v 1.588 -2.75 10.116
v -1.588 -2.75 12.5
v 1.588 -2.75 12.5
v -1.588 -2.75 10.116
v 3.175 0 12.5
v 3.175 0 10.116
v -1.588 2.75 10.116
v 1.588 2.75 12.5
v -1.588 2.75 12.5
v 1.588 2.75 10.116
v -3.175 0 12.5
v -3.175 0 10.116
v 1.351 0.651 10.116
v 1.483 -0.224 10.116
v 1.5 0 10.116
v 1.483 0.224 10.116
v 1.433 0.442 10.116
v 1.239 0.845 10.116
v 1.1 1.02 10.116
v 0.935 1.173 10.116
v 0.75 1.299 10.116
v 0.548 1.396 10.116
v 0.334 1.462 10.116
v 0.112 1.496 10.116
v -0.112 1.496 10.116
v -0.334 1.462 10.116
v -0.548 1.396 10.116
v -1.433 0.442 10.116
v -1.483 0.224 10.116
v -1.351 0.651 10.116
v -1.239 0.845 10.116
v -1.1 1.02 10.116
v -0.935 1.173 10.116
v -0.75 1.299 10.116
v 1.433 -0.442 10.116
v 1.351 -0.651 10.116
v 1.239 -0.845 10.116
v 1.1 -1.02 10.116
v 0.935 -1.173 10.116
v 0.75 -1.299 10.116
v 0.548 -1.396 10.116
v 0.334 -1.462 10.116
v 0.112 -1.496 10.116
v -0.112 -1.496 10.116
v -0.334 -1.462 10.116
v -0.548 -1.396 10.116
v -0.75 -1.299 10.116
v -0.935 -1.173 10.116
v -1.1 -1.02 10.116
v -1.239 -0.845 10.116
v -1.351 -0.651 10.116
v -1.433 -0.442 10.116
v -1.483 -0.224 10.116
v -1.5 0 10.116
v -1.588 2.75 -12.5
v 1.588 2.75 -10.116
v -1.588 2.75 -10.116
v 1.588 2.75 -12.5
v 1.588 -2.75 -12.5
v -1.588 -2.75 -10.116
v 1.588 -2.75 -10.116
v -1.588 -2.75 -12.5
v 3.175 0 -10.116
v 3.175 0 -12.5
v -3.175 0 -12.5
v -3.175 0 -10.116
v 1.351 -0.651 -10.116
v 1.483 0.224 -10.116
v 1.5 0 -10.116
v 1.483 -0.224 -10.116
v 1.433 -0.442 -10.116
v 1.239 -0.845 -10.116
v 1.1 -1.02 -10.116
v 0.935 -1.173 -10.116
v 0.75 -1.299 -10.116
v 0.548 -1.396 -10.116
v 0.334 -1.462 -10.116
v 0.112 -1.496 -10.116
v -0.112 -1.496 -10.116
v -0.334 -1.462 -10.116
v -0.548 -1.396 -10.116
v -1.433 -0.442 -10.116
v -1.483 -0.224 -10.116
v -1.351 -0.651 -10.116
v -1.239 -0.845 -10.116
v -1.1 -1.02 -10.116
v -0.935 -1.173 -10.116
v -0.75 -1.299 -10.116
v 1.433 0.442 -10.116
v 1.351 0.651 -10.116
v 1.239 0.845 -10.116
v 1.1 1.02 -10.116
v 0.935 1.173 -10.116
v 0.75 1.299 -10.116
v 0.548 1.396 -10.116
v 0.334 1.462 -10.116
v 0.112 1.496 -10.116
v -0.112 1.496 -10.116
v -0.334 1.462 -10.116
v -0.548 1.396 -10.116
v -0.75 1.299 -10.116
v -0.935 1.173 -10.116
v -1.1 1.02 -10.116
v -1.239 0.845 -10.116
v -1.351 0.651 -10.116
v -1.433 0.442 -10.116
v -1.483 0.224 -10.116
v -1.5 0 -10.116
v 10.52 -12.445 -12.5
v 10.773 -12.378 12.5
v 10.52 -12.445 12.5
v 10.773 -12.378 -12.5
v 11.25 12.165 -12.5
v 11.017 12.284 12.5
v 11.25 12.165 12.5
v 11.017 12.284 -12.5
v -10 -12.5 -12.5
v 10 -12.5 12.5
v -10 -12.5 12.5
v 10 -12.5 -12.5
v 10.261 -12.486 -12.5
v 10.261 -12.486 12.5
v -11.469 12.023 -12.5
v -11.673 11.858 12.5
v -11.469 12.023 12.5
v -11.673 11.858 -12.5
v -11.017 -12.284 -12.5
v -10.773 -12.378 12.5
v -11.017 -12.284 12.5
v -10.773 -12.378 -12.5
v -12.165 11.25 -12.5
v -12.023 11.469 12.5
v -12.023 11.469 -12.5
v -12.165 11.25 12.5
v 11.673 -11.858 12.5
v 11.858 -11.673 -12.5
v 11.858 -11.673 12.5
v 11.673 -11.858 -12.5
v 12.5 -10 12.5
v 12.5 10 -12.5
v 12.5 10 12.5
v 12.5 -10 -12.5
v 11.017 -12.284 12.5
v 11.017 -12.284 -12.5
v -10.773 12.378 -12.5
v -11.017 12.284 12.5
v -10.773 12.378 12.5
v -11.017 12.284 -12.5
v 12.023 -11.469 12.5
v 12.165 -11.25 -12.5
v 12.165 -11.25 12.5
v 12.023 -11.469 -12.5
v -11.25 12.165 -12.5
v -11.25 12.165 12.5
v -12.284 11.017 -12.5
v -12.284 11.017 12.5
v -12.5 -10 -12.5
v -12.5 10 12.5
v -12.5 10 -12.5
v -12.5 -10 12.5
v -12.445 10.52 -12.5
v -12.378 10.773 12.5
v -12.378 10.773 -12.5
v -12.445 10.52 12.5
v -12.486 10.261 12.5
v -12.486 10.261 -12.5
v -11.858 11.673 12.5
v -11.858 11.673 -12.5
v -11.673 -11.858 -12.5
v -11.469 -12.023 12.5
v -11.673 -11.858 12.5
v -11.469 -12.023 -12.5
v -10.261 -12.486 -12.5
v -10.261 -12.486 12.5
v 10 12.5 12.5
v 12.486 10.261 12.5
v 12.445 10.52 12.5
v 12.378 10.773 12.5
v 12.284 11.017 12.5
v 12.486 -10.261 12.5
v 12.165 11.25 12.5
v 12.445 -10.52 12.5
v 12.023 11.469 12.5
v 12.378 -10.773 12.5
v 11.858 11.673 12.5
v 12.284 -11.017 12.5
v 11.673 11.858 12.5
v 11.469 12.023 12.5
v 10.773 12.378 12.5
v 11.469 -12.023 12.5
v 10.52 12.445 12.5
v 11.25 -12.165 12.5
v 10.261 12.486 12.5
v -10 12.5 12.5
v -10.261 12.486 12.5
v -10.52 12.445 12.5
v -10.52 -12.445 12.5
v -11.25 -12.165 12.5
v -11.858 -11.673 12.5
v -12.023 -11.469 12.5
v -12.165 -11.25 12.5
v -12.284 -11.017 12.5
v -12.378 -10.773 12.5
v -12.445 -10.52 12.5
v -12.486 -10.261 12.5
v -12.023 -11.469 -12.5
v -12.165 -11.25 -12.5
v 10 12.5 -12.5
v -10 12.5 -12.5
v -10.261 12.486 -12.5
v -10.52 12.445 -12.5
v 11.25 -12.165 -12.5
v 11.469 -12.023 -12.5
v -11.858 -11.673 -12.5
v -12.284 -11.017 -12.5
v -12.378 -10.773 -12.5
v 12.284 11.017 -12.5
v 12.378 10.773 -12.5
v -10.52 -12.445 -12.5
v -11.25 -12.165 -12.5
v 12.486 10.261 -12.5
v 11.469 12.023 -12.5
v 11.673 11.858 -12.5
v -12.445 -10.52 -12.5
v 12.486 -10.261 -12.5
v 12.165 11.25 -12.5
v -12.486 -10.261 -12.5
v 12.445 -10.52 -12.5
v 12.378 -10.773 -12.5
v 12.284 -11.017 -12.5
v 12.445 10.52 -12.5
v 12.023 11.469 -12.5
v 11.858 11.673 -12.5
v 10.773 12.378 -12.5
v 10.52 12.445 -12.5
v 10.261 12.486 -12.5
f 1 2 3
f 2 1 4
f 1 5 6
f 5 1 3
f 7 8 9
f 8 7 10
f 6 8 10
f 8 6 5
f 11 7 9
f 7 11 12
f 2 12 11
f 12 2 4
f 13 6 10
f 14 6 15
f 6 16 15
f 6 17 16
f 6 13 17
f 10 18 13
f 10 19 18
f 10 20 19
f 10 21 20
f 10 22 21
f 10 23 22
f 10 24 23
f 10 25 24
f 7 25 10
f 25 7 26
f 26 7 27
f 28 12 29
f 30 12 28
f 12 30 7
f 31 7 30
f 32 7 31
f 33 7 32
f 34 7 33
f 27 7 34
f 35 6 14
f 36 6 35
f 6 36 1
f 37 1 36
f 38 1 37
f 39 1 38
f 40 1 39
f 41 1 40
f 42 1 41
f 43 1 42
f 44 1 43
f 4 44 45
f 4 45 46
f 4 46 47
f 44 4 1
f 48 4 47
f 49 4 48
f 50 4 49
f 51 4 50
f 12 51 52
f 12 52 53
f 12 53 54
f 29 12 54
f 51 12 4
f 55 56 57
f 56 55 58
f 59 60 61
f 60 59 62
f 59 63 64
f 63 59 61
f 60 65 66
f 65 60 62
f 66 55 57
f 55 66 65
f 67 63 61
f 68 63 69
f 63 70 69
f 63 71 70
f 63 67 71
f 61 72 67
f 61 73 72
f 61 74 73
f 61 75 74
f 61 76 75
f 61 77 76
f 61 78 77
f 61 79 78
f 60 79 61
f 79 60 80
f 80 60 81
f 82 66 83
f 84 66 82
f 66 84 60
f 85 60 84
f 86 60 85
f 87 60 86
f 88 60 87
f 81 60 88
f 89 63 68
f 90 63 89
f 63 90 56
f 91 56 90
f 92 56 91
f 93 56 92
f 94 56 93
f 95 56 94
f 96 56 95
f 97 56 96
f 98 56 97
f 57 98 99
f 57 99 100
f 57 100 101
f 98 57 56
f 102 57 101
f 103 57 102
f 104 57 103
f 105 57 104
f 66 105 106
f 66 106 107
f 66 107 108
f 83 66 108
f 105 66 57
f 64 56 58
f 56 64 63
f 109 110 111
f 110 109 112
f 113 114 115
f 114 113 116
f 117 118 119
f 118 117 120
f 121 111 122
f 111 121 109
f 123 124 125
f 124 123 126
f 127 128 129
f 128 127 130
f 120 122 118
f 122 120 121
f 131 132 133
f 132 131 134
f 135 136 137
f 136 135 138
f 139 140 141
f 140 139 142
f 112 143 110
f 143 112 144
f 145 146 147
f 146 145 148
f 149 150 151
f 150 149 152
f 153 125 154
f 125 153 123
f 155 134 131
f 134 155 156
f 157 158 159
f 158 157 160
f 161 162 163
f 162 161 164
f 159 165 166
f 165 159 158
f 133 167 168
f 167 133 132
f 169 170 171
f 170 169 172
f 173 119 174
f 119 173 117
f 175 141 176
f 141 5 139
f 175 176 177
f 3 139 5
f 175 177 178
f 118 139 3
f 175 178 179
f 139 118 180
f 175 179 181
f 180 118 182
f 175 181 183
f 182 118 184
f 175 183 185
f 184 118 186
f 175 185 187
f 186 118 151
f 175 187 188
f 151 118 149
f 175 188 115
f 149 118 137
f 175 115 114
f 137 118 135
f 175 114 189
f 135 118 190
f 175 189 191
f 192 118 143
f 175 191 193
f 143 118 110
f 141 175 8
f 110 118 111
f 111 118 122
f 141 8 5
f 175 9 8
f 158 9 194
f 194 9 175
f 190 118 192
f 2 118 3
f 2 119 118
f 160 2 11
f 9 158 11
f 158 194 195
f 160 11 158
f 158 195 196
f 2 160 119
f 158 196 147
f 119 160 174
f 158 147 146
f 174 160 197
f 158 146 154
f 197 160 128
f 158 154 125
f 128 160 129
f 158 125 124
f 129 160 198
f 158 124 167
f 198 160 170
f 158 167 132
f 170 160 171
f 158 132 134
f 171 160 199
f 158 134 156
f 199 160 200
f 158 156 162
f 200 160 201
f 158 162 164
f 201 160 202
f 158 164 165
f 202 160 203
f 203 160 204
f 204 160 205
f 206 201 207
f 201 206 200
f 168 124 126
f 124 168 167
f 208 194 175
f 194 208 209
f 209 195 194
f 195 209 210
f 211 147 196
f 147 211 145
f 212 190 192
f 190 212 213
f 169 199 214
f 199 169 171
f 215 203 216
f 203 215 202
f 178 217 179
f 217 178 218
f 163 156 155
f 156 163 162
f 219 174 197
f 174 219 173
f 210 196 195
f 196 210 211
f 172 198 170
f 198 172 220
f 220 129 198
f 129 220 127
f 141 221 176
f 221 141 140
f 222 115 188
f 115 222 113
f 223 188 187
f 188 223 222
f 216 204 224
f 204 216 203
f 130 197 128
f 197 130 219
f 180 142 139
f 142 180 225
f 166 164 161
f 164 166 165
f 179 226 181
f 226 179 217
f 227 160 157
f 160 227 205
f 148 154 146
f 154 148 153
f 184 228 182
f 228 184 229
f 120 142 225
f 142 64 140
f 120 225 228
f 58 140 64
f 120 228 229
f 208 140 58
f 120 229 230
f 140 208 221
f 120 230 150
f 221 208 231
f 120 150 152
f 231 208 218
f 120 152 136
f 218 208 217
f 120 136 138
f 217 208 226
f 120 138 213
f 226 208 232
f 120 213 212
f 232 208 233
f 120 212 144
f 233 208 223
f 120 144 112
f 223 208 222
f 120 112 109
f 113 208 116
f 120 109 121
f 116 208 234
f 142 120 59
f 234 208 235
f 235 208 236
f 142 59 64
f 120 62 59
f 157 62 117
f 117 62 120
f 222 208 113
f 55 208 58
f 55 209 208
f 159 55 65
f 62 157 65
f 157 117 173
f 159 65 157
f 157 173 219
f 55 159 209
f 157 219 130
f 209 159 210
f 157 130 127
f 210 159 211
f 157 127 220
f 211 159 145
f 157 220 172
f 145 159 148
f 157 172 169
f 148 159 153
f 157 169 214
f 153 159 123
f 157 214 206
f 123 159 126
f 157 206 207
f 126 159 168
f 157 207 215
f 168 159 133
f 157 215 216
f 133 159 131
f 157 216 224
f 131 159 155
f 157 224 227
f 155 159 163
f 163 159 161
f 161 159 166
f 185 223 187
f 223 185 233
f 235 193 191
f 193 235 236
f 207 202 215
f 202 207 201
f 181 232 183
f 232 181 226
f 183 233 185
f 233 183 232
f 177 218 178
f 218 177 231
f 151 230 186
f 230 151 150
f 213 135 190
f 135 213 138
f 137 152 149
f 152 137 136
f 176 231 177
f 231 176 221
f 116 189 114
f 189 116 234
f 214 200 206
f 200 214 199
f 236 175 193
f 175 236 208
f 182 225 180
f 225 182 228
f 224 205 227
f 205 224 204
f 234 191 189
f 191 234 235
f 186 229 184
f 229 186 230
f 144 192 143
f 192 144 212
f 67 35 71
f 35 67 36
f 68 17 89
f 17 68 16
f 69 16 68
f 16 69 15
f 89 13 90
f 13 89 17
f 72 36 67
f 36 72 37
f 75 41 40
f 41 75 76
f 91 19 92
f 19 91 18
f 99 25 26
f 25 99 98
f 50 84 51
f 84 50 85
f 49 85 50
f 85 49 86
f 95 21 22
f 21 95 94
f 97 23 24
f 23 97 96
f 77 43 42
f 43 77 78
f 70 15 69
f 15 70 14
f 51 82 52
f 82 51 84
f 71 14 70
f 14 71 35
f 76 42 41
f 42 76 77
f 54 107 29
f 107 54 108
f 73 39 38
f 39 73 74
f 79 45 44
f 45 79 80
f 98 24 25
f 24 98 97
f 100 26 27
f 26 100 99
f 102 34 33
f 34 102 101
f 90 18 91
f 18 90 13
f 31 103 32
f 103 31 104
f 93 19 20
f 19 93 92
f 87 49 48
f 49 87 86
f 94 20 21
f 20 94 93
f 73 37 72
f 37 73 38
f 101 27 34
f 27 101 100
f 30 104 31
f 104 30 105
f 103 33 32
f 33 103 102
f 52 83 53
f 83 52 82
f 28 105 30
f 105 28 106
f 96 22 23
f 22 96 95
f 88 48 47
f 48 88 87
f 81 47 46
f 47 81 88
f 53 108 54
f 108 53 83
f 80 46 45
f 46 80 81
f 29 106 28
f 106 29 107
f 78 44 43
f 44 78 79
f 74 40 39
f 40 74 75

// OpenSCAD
// file: ../../globals.scad
//$fa = $preview? 12 : 6;
//$fs = $preview? 2 : 0.2;

EPS = 1/64;

// Used for indexing coordinates since the dot syntax is not
// officialy supported
X = 0;
Y = 1;
Z = 2;

// Slicer defaults
LAYER_HEIGHT = 0.15;
EXTRUSION_WIDTH = 0.45;

function nearest_layer_height(n) = round(n / LAYER_HEIGHT) * LAYER_HEIGHT;
function nearest_extrusion_width(n) = round(n / EXTRUSION_WIDTH) * EXTRUSION_WIDTH;

// Defaults for all parts
WALL_XS = nearest_extrusion_width(1.25);
WALL_S = nearest_extrusion_width(2);
WALL = nearest_extrusion_width(3);
WALL_L = nearest_extrusion_width(5);
WALL_XL = nearest_extrusion_width(7.5);

// Seems to be a good middle ground, corresponds to #8 for imperial ones
SCREW = 4;

// Set up OpenSCAD rendering defaults
$fa = 6;
$fs = EXTRUSION_WIDTH / 2;

function default(v, d) = is_undef(v)? d : v;

// For engraving in all planes except those parrallel to XY.
module v_engrave(t, size=10) {
    translate([0, 0.3, 0])
    rotate([90,0,0])
    linear_extrude(0.3 + EPS)
    text(t, size=size, font="DejaVu Sans:style=Book", valign="center", halign="center", $fn=8);
}

// For engraving in all planes parrallel to XY.
module h_engrave(t, size=10) {
    translate([0, 0, -0.7])
    linear_extrude(0.7 + EPS)
    text(t, size=size, font="DejaVu Sans:style=Book", valign="center", halign="center", $fn=8);
}

// Used for creating screw holes
module screw(height, head_extra_height=0) {
    translate([0,0, -(height + head_extra_height) / 2]) {
        cylinder(height, r=SCREW/2);
        
        translate([0,0,height-SCREW/2])
        cylinder(SCREW/2, r1=SCREW/2, r2=SCREW);
        
        translate([0,0,height - EPS])
        cylinder(head_extra_height + EPS, r=SCREW);
    }
}
// main file
include <../../globals.scad>;
use <../../dim.scad>;

SIDE_LENGTH = 25;

BORE_DIAMETER = 3;

HEX_WRENCH_SIZE = 5.5;

HEX_HEIGHT = 2.4;

module drill_guide(
    side_length,
    bore_diameter,
    hex_wrench_size,
    hex_height,
    height=25
)
{
    hex_diameter = hex_wrench_size / cos(180/6);
    
    difference() {
        linear_extrude(height, center=true)
        offset(r=0.1 * side_length)
        offset(delta=-0.1 * side_length)
        square([side_length, side_length], center=true);
        
        cylinder(height + 2*EPS, r=bore_diameter/2, center=true);
        
        if(hex_wrench_size) {
            translate([0,0,height/2 - hex_height + EPS])
            cylinder(hex_height, r=hex_diameter/2, $fn=6);

            rotate([180,0,0])
            translate([0,0,height/2 - hex_height + EPS])
            cylinder(hex_height, r=hex_diameter/2, $fn=6);
        }
    }
    
    // Documentation
    translate([0,0, height/2]) {
        dim_xy_diameter(hex_wrench_size);
        dim_xy_diameter(bore_diameter, theta=45);
    }

    translate([0,0, -height/2]) {
        translate([0,-side_length/2]) dim_x(side_length);
        translate([side_length/2,0]) dim_y(side_length);
    }
    translate([-side_length/2,-side_length/2]) dim_z(height);

}

drill_guide(SIDE_LENGTH, BORE_DIAMETER, HEX_WRENCH_SIZE, HEX_HEIGHT);
